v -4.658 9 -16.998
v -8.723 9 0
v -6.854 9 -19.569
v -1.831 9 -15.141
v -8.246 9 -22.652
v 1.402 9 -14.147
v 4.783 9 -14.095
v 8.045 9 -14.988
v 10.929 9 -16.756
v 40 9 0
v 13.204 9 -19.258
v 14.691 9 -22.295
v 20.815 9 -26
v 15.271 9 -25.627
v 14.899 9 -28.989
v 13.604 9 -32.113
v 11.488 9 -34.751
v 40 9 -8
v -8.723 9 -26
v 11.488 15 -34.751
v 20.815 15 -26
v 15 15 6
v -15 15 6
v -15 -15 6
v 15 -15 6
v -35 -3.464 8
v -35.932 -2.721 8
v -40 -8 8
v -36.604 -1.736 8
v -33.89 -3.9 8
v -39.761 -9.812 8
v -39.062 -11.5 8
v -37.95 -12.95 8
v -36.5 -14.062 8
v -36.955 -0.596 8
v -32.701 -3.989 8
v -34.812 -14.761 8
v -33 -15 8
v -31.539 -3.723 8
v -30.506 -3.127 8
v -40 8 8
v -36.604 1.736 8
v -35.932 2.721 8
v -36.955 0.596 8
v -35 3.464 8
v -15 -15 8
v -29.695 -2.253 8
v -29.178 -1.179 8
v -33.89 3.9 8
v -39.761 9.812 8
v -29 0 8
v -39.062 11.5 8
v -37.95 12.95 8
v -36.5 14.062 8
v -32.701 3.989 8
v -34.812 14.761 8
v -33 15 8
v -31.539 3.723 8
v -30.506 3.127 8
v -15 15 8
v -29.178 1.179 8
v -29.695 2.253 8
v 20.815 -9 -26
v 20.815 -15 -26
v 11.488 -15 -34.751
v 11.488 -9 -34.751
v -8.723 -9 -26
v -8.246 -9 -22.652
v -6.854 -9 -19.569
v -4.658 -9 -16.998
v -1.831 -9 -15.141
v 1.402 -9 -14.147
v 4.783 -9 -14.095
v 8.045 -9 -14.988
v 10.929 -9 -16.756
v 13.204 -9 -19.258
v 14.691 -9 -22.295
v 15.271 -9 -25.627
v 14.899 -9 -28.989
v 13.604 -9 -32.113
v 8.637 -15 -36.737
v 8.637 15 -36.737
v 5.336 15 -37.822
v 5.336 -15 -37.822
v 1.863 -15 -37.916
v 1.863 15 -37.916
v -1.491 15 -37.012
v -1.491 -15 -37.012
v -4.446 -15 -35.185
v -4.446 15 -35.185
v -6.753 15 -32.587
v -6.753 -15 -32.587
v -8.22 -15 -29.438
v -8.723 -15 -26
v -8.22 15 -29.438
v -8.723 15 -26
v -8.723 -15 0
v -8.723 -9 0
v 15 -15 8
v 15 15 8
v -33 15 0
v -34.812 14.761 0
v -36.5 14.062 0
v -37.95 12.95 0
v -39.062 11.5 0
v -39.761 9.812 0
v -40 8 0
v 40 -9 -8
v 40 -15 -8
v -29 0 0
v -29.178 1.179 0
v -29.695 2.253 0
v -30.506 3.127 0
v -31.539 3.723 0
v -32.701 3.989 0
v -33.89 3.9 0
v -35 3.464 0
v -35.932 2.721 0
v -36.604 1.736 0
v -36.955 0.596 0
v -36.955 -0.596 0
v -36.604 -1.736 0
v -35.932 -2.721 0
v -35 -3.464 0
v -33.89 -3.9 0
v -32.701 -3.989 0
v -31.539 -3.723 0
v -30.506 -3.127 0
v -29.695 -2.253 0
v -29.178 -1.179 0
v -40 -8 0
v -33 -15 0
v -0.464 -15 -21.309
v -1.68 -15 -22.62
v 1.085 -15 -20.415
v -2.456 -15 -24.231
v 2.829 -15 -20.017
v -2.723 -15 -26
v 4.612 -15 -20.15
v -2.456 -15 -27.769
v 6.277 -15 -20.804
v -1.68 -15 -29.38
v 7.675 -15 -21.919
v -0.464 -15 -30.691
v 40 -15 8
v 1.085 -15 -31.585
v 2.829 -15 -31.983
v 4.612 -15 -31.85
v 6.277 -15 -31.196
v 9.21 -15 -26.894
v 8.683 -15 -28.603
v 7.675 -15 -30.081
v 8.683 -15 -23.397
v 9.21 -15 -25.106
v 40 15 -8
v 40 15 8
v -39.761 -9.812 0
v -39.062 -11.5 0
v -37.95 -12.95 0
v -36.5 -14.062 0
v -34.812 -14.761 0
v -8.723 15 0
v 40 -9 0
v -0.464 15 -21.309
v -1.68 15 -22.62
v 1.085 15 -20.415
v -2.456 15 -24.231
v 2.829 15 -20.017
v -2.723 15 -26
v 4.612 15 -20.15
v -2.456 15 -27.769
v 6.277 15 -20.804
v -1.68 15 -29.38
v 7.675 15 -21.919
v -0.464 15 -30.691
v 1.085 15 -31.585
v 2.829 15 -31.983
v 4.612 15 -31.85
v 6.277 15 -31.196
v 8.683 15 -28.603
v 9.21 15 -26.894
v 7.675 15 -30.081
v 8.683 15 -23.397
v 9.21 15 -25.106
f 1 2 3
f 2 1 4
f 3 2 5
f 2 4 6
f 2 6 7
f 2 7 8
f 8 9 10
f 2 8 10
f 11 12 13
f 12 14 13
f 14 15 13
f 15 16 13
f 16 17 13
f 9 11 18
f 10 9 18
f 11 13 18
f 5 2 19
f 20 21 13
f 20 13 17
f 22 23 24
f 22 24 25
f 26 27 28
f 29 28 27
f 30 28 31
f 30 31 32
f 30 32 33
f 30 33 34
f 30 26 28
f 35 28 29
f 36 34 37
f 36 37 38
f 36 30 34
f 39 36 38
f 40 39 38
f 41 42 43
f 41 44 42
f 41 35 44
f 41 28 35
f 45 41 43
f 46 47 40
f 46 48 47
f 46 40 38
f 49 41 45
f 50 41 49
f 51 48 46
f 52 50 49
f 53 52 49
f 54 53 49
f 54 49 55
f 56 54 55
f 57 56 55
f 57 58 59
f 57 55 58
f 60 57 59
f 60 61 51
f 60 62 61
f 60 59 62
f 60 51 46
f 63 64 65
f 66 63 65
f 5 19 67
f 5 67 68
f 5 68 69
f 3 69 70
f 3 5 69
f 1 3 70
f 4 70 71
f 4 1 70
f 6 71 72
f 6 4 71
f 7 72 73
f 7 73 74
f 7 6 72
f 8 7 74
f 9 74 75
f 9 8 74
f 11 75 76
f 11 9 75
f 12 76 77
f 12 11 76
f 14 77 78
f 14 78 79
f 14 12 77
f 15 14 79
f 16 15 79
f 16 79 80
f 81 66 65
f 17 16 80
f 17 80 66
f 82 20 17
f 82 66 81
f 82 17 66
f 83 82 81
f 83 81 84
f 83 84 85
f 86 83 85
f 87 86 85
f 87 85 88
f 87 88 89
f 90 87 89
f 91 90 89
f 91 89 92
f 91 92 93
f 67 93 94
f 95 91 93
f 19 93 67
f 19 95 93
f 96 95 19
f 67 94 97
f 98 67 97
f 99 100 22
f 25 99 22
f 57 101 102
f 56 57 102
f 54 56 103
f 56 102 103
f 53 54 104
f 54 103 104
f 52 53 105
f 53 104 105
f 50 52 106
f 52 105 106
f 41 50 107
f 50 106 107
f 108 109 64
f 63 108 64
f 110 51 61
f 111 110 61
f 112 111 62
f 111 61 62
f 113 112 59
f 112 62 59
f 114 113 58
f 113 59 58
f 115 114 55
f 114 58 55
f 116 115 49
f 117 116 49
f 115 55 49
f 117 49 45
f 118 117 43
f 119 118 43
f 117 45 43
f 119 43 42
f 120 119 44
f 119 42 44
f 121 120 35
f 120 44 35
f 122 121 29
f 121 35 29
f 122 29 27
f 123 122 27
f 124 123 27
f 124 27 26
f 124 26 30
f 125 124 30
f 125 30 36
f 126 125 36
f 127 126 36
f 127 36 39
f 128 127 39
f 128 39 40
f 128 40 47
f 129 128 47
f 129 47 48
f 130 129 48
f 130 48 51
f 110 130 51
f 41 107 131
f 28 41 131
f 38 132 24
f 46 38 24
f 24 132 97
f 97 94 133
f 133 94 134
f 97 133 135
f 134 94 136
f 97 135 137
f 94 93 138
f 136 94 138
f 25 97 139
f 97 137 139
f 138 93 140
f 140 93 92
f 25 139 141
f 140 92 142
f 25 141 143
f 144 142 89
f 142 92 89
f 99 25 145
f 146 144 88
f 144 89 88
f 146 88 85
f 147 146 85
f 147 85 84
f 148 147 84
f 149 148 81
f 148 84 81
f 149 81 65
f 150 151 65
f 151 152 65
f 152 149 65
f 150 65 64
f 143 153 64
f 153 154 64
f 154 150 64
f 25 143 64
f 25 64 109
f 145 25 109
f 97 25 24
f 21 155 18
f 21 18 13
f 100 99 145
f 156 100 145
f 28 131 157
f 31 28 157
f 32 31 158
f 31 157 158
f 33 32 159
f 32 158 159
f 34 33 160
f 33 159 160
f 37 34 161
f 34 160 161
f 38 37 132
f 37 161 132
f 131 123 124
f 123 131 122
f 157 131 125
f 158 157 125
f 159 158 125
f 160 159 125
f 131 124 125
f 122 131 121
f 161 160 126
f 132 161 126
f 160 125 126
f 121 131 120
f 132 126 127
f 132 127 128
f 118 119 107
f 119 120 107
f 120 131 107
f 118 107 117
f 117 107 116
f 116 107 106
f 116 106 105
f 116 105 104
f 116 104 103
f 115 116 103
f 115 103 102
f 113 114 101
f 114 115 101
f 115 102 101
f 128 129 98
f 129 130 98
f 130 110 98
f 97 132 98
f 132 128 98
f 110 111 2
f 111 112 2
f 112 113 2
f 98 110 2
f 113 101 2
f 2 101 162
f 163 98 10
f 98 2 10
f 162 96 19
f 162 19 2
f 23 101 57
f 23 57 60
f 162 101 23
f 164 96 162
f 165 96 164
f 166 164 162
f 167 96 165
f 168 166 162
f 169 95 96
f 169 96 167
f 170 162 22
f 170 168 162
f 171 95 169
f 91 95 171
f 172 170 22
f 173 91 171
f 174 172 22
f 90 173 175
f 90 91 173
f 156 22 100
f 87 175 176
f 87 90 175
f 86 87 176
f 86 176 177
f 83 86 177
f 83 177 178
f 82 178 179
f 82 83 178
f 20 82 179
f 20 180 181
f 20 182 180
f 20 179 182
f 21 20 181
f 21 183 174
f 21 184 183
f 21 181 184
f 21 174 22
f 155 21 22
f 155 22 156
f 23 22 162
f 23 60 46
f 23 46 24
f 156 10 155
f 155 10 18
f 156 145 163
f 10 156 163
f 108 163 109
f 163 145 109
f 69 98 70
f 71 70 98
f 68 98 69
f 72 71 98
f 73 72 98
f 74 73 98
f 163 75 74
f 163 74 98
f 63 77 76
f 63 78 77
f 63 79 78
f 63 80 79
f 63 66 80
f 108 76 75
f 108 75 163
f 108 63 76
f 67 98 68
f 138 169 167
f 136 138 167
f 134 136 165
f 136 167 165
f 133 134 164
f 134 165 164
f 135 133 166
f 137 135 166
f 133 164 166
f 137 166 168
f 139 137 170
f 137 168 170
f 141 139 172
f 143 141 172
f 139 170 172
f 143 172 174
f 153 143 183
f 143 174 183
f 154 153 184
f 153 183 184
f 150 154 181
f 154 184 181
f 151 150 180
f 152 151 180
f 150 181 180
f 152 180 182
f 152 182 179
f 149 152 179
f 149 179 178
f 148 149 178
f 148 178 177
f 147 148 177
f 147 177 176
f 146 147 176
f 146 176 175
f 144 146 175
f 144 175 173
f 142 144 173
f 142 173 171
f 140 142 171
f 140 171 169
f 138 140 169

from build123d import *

# Parameters (mm, degrees)
BOSS_EXTRUDE1_DEPTH = 8
SKETCH2_R           = 4
CUT_EXTRUDE1_DEPTH  = 44.462627624
BOSS_EXTRUDE2_DEPTH = 6
SKETCH5_R           = 12
BOSS_EXTRUDE3_DEPTH = 30
SKETCH8_R           = 6
CUT_EXTRUDE2_DEPTH  = 63.801273872
SKETCH9_W           = 30
SKETCH9_H           = 2
CUT_EXTRUDE3_DEPTH  = 63.801273872


with BuildPart() as part:
    # Sketch1 → Boss-Extrude1 (new body)
    with BuildSketch(Plane.XY):
        with BuildLine():
            Line((-33, -15), (40, -15))
            Line((40, -15), (40, 15))
            Line((40, 15), (-33, 15))
            ThreePointArc((-33, 15), (-37.949747468, 12.949747468), (-40, 8))
            Line((-40, 8), (-40, -8))
            ThreePointArc((-40, -8), (-37.949747468, -12.949747468), (-33, -15))
        make_face()
    extrude(amount=BOSS_EXTRUDE1_DEPTH)

    # Sketch2 → Cut-Extrude1 (cut, through all)
    with BuildSketch(Plane.XY.offset(8)):
        with Locations((-33, 0)):
            Circle(SKETCH2_R)
    extrude(amount=-CUT_EXTRUDE1_DEPTH, mode=Mode.SUBTRACT)

    # Sketch3 → Boss-Extrude2 (add)
    with BuildSketch(Plane(origin=(0, 15, 0), x_dir=(1, 0, 0), z_dir=(0, 1, 0))):
        Polygon((-8.722846682, 0), (40, 0), (40, 8), (20.815154113, 26), (-8.722846682, 26), align=None)
        Polygon((-8.722846682, 26), (20.815154113, 26), (11.487895334, 34.751212233), align=None)
    boss_extrude2 = extrude(amount=-BOSS_EXTRUDE2_DEPTH)

    # Mirror1: Boss-Extrude2 across plane
    add(boss_extrude2.mirror(Plane.ZX))

    # Sketch5 → Boss-Extrude3 (add, through all)
    with BuildSketch(Plane(origin=(0, 15, 0), x_dir=(1, 0, 0), z_dir=(0, 1, 0))):
        with Locations(Location((3.277153318, 26, 0), (0, 0, 180))):
            Circle(SKETCH5_R)
    extrude(amount=-BOSS_EXTRUDE3_DEPTH)

    # Sketch8 → Cut-Extrude2 (cut, through all)
    with BuildSketch(Plane(origin=(0, 15, 0), x_dir=(1, 0, 0), z_dir=(0, 1, 0))):
        with Locations(Location((3.277153318, 26, 0), (0, 0, 180))):
            Circle(SKETCH8_R)
    extrude(amount=-CUT_EXTRUDE2_DEPTH, mode=Mode.SUBTRACT)

    # Sketch9 → Cut-Extrude3 (cut, through all)
    with BuildSketch(Plane(origin=(0, 15, 0), x_dir=(1, 0, 0), z_dir=(0, 1, 0))):
        with Locations((0, -7)):
            Rectangle(SKETCH9_W, SKETCH9_H)
    extrude(amount=-CUT_EXTRUDE3_DEPTH, mode=Mode.SUBTRACT)


solid = part.part
